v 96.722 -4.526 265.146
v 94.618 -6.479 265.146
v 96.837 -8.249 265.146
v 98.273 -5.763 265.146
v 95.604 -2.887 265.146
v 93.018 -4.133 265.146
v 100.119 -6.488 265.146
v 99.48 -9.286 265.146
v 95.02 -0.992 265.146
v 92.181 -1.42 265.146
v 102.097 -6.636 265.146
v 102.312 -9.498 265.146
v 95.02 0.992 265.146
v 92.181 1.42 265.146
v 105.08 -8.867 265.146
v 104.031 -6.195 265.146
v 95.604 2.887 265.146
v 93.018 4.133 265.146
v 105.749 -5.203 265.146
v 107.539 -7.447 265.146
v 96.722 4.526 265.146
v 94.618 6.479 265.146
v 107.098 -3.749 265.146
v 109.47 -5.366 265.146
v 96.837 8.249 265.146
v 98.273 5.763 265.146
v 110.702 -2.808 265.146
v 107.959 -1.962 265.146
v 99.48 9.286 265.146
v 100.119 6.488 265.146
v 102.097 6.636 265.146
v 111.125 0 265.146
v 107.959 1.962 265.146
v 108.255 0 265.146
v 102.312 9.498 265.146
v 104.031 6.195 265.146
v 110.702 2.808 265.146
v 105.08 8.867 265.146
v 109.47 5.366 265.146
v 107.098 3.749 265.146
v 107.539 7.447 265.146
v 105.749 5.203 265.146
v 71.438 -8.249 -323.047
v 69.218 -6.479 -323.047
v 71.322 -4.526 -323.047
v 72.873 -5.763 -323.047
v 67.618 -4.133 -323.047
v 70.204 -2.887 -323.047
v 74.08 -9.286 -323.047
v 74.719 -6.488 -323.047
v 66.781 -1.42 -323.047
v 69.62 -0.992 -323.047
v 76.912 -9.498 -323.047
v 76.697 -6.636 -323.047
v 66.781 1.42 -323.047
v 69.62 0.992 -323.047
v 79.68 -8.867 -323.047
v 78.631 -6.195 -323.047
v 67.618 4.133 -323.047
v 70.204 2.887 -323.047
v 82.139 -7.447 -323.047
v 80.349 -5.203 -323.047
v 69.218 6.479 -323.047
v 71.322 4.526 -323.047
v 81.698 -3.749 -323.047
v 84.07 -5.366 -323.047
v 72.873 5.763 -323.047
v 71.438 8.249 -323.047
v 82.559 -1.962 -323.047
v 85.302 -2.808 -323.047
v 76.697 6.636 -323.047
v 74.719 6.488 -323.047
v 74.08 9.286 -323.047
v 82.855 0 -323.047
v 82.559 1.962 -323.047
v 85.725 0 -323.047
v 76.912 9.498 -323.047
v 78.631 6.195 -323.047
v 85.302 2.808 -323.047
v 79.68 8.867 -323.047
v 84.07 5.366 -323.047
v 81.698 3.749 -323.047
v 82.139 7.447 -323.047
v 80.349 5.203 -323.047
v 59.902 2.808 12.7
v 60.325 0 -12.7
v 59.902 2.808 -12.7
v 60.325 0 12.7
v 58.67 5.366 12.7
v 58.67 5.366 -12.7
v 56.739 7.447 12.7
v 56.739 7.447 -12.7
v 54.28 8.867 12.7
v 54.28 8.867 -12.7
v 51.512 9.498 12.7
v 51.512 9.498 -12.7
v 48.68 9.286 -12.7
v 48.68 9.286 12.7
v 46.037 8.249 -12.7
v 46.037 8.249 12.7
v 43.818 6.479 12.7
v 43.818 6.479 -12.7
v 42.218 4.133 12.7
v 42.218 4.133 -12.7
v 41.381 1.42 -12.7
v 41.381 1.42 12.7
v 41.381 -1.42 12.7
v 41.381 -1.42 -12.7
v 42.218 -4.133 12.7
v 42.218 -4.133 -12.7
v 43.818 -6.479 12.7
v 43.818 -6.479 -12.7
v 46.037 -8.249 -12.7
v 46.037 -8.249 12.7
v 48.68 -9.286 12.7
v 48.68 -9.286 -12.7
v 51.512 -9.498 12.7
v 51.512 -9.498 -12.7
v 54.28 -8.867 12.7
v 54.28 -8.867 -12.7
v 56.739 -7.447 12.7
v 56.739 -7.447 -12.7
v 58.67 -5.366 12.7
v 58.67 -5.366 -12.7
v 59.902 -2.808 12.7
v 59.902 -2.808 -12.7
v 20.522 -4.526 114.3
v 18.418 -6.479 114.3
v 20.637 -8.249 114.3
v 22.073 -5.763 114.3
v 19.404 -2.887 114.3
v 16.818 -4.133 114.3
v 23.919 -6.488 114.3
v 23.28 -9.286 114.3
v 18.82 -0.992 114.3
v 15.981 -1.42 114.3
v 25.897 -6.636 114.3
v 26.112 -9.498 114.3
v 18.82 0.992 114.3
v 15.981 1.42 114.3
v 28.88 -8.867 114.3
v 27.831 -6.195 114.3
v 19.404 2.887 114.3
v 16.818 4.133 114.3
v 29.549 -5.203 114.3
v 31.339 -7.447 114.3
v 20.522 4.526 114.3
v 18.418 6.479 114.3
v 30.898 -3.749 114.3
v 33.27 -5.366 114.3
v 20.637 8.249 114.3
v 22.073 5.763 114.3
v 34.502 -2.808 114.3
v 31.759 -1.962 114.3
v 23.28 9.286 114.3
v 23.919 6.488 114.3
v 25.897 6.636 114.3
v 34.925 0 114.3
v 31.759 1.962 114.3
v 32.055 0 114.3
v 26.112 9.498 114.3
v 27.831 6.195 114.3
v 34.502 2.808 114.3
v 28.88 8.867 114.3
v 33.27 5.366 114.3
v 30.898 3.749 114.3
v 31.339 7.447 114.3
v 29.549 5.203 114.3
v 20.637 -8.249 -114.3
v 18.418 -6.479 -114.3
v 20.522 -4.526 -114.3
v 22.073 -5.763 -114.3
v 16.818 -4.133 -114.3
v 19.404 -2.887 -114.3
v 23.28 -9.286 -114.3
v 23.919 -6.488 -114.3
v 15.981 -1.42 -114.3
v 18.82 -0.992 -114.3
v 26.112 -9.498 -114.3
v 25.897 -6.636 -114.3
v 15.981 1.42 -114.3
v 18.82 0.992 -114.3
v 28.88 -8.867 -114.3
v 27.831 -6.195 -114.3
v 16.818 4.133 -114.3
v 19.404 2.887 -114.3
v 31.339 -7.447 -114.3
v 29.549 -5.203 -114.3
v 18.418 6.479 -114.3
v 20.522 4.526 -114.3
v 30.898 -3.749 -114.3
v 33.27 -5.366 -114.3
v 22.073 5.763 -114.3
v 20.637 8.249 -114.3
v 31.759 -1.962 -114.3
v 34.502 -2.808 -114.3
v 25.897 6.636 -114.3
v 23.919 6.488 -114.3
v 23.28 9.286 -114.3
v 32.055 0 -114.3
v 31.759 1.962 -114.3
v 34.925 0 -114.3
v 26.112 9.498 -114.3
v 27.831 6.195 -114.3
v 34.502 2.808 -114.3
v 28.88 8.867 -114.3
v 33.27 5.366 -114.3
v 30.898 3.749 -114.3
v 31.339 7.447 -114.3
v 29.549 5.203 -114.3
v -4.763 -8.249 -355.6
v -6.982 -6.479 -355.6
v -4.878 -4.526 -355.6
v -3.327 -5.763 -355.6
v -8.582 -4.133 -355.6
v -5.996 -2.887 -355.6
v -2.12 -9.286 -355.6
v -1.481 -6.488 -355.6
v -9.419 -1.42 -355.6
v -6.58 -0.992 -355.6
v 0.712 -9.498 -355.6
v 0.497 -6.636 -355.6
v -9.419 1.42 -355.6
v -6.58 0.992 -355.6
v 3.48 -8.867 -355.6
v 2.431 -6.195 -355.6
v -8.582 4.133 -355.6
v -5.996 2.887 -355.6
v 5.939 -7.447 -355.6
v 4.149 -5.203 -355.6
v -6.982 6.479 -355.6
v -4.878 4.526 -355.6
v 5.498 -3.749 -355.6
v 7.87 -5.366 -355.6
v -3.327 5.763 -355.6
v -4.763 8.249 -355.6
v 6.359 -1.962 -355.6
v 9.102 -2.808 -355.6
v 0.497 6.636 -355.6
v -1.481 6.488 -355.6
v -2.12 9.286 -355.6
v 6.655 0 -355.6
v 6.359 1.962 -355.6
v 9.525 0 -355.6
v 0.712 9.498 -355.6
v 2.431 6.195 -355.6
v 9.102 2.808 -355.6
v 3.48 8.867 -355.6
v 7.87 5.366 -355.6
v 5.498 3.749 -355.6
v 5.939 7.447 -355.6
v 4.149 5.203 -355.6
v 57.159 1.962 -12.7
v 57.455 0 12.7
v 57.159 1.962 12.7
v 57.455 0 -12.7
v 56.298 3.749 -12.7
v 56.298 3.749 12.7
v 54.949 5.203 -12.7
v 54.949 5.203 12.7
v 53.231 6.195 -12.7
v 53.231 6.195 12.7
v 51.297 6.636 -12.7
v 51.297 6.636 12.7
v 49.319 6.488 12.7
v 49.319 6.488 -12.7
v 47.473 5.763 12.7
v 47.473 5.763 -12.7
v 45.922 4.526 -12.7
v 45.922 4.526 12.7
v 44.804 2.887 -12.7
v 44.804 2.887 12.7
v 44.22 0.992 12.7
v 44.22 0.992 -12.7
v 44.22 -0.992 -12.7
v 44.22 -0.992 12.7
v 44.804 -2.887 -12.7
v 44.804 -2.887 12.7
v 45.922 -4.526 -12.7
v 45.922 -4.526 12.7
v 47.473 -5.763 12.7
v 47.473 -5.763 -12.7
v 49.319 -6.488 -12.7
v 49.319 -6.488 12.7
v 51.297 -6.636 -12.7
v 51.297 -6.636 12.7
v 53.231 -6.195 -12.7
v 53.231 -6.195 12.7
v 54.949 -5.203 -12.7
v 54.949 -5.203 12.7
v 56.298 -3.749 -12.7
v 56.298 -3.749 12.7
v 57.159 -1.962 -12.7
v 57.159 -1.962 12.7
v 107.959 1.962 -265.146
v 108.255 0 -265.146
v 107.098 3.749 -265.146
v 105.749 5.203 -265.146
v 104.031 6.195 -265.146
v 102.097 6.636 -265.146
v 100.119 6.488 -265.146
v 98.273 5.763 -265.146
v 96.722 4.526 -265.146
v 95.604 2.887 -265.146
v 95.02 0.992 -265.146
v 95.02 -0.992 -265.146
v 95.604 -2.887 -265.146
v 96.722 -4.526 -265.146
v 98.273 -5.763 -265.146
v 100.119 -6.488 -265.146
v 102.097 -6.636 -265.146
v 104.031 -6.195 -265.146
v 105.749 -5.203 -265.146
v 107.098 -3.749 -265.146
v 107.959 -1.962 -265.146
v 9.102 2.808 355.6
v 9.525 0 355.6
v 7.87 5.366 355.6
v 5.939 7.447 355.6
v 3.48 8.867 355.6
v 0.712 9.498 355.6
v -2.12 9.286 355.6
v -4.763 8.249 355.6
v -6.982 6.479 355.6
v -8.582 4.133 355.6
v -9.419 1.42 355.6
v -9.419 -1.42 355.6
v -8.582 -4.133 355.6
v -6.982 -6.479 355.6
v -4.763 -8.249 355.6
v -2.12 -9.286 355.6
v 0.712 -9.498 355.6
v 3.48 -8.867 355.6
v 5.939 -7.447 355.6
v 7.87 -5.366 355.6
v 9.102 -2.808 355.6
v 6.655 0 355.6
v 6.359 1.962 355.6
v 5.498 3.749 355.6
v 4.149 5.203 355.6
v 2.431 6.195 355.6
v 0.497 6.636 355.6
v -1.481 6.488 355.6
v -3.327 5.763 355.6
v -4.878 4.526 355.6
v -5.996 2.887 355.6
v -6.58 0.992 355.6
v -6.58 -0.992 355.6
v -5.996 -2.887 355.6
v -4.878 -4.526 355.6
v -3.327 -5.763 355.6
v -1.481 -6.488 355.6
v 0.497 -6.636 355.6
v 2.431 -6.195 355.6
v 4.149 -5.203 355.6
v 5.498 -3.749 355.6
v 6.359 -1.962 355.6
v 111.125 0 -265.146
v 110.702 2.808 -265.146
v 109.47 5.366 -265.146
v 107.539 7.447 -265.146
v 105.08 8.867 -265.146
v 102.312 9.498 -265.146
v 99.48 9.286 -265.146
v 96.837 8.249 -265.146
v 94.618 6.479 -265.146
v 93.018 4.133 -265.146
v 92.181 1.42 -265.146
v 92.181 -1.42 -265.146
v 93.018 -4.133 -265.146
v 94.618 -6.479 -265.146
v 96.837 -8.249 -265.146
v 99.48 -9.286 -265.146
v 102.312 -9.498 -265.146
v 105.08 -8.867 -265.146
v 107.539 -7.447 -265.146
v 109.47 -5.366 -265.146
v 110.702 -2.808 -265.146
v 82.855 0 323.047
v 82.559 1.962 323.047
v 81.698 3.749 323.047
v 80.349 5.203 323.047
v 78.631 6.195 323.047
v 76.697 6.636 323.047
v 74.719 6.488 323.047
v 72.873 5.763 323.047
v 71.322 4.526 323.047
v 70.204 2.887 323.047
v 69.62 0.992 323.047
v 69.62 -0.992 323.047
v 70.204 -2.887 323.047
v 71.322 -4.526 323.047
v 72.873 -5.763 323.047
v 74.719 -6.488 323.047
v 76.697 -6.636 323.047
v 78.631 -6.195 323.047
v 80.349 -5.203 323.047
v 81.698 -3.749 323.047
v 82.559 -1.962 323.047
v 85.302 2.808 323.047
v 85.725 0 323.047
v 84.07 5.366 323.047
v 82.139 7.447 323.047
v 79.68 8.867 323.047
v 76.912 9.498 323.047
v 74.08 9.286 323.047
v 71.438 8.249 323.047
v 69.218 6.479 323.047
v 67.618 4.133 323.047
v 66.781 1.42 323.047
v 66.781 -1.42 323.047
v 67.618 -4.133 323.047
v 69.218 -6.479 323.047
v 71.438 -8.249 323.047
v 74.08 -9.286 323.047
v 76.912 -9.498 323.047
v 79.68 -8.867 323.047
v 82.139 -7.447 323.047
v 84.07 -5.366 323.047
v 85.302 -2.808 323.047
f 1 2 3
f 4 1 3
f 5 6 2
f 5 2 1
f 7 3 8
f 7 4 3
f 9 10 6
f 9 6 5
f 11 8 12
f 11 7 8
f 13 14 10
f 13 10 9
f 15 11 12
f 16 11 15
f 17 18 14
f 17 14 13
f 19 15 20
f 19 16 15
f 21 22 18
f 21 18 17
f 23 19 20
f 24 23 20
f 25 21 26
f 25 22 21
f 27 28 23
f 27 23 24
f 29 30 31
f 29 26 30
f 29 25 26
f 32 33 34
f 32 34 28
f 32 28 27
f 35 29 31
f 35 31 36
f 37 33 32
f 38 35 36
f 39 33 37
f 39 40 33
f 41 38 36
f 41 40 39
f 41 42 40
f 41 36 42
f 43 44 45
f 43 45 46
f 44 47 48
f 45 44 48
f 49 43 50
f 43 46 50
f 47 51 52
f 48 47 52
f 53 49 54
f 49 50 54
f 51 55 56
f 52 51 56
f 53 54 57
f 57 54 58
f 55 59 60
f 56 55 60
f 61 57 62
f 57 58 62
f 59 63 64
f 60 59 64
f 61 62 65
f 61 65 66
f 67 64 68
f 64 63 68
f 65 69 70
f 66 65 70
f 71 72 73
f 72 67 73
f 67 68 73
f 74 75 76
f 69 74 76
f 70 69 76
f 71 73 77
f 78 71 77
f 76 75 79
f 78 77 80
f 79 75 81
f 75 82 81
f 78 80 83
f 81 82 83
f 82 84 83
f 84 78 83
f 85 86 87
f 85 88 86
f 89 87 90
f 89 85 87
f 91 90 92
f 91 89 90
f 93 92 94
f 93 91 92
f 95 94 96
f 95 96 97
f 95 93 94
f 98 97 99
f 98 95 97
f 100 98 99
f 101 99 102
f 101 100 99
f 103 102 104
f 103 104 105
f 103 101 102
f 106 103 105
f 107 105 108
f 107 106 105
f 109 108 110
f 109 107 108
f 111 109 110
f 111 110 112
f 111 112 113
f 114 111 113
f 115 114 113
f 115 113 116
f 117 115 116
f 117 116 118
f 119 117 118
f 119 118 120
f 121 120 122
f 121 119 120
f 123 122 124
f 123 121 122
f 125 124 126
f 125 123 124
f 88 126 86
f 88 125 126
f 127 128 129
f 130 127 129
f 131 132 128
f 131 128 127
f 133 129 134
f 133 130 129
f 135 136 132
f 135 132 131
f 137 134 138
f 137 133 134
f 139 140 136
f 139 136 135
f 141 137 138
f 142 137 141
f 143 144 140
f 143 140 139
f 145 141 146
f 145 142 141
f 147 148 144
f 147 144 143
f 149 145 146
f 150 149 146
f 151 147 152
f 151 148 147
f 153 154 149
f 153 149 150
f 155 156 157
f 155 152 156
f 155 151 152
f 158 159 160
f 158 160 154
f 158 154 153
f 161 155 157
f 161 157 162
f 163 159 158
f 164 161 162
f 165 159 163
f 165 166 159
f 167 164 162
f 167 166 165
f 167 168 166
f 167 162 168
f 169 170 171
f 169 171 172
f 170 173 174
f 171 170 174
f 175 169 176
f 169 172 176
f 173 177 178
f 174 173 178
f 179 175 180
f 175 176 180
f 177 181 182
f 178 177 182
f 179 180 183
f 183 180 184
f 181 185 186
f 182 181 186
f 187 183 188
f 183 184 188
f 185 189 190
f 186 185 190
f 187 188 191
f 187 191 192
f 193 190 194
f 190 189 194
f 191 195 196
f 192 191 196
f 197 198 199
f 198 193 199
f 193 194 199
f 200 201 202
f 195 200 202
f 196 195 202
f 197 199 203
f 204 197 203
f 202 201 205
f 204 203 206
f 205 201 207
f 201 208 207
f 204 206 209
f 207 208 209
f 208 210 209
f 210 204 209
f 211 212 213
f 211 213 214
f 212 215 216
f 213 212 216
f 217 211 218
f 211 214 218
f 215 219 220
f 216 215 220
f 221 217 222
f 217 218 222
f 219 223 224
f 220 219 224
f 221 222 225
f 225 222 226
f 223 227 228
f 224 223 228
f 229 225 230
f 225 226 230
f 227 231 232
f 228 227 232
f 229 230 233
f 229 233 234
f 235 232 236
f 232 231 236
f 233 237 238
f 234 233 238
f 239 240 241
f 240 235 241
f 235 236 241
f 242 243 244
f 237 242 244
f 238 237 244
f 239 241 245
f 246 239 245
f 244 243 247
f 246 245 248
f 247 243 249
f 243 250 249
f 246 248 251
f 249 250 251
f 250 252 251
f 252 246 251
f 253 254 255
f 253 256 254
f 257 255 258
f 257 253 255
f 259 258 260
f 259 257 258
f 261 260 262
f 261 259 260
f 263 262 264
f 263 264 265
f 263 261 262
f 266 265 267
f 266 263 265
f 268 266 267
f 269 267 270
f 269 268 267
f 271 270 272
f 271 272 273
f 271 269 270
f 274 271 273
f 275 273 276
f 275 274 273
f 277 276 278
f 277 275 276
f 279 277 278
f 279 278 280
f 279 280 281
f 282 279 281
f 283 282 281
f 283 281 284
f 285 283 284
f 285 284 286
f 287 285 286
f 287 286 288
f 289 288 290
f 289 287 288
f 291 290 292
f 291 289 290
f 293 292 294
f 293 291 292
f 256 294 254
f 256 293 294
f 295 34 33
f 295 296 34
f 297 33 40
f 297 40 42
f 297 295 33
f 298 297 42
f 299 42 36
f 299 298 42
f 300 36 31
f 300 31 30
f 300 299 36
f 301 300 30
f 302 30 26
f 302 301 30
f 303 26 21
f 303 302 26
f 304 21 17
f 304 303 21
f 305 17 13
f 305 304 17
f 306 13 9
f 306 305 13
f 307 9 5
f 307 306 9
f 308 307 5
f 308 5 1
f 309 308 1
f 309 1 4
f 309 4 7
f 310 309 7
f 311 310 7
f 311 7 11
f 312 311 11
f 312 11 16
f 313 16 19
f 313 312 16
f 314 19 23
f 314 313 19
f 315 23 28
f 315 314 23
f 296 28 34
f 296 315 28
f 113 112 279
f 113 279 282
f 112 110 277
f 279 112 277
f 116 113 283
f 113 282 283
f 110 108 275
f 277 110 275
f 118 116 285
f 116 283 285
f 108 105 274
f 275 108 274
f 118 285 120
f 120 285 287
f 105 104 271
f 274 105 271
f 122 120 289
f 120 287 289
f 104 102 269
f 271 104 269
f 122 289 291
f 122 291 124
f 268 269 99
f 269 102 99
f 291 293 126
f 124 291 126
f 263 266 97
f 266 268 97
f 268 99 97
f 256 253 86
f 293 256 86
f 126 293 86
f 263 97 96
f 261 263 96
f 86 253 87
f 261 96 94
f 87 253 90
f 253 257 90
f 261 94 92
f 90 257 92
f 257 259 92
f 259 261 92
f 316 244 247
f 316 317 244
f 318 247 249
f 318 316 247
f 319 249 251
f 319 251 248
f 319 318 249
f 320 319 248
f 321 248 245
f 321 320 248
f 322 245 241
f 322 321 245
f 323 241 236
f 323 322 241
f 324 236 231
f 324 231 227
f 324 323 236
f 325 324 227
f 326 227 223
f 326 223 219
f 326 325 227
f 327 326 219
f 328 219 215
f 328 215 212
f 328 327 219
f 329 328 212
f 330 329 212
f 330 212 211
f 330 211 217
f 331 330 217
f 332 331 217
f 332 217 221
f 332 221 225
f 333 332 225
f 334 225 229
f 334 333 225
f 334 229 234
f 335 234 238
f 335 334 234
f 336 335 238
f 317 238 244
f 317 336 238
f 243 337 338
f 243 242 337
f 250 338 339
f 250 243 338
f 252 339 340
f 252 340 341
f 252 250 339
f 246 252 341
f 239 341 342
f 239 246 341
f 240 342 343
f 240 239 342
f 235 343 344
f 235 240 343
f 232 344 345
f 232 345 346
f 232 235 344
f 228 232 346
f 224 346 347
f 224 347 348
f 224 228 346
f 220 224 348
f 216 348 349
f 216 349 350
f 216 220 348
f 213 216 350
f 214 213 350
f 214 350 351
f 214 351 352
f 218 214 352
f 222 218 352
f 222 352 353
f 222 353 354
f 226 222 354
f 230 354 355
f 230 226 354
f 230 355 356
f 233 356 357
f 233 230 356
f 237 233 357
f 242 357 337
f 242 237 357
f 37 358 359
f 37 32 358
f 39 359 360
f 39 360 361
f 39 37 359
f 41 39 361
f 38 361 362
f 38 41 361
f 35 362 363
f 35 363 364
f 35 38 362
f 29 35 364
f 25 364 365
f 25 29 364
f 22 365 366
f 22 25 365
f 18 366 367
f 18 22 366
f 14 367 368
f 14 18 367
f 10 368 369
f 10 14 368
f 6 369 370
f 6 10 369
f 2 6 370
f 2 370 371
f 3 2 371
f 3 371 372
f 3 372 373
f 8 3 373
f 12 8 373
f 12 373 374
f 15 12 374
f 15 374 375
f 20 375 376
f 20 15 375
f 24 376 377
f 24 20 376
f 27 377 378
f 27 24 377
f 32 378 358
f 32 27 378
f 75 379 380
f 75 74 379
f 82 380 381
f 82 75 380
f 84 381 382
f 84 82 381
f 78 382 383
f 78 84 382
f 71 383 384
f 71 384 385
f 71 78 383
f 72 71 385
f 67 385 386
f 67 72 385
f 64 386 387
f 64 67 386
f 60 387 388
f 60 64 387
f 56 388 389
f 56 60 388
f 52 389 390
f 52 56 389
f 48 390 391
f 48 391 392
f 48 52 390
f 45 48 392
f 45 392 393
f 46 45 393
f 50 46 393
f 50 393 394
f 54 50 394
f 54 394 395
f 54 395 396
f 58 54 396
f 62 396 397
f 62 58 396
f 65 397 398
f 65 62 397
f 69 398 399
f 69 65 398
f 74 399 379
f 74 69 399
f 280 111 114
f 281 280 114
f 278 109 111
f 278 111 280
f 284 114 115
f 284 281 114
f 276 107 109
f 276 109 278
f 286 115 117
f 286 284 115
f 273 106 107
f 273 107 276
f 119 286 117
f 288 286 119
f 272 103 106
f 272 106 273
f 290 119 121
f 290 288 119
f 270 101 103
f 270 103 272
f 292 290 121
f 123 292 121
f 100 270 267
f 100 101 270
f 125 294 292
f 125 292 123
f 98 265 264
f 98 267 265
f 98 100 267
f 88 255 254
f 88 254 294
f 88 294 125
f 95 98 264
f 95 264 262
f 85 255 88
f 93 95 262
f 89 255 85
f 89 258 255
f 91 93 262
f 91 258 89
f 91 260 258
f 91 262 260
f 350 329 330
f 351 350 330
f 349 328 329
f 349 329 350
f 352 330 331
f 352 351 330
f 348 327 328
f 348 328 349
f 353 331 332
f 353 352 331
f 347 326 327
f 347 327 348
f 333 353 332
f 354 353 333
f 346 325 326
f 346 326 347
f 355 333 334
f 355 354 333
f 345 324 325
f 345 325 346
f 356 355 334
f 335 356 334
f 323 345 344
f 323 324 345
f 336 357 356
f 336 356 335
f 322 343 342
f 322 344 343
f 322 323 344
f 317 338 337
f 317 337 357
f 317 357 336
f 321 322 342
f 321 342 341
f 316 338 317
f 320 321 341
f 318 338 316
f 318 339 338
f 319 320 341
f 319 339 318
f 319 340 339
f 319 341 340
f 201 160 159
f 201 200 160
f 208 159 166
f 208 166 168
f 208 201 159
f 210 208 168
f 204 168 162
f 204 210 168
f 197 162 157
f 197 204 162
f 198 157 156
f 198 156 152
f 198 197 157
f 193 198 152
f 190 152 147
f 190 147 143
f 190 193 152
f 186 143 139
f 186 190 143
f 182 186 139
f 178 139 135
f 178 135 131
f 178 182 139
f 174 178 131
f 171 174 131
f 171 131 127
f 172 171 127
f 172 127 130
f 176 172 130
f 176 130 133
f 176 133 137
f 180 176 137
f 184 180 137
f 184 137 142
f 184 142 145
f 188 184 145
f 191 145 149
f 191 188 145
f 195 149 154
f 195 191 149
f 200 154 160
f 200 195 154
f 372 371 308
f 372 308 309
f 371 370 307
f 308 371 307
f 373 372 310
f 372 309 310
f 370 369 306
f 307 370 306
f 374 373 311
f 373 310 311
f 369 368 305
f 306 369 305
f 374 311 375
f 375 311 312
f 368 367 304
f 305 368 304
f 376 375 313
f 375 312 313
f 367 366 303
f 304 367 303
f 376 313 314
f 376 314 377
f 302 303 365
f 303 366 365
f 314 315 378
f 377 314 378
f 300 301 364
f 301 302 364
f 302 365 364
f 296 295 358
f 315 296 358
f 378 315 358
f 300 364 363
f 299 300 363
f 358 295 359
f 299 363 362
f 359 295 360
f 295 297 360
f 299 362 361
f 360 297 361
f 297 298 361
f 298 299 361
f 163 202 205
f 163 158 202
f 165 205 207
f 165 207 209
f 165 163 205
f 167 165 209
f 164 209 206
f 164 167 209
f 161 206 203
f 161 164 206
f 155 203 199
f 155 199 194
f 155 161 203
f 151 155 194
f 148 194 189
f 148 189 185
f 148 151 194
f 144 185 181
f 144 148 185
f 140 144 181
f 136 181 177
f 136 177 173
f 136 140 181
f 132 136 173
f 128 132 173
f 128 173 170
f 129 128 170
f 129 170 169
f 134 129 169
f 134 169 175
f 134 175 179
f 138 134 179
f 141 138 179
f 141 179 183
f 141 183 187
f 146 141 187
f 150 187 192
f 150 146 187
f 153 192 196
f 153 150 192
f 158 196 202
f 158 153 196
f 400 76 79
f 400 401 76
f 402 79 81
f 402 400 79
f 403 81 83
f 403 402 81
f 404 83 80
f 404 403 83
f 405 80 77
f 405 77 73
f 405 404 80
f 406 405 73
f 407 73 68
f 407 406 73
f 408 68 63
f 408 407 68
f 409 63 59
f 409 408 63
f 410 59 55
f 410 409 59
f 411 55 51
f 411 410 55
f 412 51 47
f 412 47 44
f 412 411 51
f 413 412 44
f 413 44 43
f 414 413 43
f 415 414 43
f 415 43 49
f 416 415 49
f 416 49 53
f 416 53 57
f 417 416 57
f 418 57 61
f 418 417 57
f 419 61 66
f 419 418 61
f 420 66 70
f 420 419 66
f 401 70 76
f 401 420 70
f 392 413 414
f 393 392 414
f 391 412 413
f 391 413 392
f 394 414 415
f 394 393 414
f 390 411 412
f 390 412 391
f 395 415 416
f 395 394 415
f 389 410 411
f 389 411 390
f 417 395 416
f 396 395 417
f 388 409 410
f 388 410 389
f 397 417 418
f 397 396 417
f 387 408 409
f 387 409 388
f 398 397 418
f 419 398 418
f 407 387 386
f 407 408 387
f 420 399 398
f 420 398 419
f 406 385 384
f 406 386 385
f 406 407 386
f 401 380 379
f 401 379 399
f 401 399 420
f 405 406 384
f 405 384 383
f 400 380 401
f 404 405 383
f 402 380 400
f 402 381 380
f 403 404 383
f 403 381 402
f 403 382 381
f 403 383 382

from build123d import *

# Parameters (mm, degrees)
F0_R     = 9.525
F0_R_2   = 6.6548
F1_DEPTH = 355.6
F2_R     = 9.525
F2_R_2   = 6.6548
F3_DEPTH = 114.3
F4_R     = 9.525
F4_R_2   = 6.6548
F5_DEPTH = 12.7
F6_R     = 9.525
F6_R_2   = 6.6548
F7_DEPTH = 323.04736
F8_R     = 9.525
F8_R_2   = 6.6548
F9_DEPTH = 265.14552


with BuildPart() as f1:
    # F0 (on Top) → F1 (new body, symmetric)
    with BuildSketch(Plane.XY):
        Circle(F0_R)
        Circle(F0_R_2, mode=Mode.SUBTRACT)
    extrude(amount=F1_DEPTH, both=True)


with BuildPart() as f3:
    # F2 (on Top) → F3 (new body, symmetric)
    with BuildSketch(Plane.XY):
        with Locations((25.4, 0)):
            Circle(F2_R)
        with Locations((25.4, 0)):
            Circle(F2_R_2, mode=Mode.SUBTRACT)
    extrude(amount=F3_DEPTH, both=True)


with BuildPart() as f5:
    # F4 (on Top) → F5 (new body, symmetric)
    with BuildSketch(Plane.XY):
        with Locations((50.8, 0)):
            Circle(F4_R)
        with Locations((50.8, 0)):
            Circle(F4_R_2, mode=Mode.SUBTRACT)
    extrude(amount=F5_DEPTH, both=True)


with BuildPart() as f7:
    # F6 (on Top) → F7 (new body, symmetric)
    with BuildSketch(Plane.XY):
        with Locations((76.2, 0)):
            Circle(F6_R)
        with Locations((76.2, 0)):
            Circle(F6_R_2, mode=Mode.SUBTRACT)
    extrude(amount=F7_DEPTH, both=True)


with BuildPart() as f9:
    # F8 (on Top) → F9 (new body, symmetric)
    with BuildSketch(Plane.XY):
        with Locations((101.6, 0)):
            Circle(F8_R)
        with Locations((101.6, 0)):
            Circle(F8_R_2, mode=Mode.SUBTRACT)
    extrude(amount=F9_DEPTH, both=True)


solid = Compound([f1.part, f3.part, f5.part, f7.part, f9.part])
